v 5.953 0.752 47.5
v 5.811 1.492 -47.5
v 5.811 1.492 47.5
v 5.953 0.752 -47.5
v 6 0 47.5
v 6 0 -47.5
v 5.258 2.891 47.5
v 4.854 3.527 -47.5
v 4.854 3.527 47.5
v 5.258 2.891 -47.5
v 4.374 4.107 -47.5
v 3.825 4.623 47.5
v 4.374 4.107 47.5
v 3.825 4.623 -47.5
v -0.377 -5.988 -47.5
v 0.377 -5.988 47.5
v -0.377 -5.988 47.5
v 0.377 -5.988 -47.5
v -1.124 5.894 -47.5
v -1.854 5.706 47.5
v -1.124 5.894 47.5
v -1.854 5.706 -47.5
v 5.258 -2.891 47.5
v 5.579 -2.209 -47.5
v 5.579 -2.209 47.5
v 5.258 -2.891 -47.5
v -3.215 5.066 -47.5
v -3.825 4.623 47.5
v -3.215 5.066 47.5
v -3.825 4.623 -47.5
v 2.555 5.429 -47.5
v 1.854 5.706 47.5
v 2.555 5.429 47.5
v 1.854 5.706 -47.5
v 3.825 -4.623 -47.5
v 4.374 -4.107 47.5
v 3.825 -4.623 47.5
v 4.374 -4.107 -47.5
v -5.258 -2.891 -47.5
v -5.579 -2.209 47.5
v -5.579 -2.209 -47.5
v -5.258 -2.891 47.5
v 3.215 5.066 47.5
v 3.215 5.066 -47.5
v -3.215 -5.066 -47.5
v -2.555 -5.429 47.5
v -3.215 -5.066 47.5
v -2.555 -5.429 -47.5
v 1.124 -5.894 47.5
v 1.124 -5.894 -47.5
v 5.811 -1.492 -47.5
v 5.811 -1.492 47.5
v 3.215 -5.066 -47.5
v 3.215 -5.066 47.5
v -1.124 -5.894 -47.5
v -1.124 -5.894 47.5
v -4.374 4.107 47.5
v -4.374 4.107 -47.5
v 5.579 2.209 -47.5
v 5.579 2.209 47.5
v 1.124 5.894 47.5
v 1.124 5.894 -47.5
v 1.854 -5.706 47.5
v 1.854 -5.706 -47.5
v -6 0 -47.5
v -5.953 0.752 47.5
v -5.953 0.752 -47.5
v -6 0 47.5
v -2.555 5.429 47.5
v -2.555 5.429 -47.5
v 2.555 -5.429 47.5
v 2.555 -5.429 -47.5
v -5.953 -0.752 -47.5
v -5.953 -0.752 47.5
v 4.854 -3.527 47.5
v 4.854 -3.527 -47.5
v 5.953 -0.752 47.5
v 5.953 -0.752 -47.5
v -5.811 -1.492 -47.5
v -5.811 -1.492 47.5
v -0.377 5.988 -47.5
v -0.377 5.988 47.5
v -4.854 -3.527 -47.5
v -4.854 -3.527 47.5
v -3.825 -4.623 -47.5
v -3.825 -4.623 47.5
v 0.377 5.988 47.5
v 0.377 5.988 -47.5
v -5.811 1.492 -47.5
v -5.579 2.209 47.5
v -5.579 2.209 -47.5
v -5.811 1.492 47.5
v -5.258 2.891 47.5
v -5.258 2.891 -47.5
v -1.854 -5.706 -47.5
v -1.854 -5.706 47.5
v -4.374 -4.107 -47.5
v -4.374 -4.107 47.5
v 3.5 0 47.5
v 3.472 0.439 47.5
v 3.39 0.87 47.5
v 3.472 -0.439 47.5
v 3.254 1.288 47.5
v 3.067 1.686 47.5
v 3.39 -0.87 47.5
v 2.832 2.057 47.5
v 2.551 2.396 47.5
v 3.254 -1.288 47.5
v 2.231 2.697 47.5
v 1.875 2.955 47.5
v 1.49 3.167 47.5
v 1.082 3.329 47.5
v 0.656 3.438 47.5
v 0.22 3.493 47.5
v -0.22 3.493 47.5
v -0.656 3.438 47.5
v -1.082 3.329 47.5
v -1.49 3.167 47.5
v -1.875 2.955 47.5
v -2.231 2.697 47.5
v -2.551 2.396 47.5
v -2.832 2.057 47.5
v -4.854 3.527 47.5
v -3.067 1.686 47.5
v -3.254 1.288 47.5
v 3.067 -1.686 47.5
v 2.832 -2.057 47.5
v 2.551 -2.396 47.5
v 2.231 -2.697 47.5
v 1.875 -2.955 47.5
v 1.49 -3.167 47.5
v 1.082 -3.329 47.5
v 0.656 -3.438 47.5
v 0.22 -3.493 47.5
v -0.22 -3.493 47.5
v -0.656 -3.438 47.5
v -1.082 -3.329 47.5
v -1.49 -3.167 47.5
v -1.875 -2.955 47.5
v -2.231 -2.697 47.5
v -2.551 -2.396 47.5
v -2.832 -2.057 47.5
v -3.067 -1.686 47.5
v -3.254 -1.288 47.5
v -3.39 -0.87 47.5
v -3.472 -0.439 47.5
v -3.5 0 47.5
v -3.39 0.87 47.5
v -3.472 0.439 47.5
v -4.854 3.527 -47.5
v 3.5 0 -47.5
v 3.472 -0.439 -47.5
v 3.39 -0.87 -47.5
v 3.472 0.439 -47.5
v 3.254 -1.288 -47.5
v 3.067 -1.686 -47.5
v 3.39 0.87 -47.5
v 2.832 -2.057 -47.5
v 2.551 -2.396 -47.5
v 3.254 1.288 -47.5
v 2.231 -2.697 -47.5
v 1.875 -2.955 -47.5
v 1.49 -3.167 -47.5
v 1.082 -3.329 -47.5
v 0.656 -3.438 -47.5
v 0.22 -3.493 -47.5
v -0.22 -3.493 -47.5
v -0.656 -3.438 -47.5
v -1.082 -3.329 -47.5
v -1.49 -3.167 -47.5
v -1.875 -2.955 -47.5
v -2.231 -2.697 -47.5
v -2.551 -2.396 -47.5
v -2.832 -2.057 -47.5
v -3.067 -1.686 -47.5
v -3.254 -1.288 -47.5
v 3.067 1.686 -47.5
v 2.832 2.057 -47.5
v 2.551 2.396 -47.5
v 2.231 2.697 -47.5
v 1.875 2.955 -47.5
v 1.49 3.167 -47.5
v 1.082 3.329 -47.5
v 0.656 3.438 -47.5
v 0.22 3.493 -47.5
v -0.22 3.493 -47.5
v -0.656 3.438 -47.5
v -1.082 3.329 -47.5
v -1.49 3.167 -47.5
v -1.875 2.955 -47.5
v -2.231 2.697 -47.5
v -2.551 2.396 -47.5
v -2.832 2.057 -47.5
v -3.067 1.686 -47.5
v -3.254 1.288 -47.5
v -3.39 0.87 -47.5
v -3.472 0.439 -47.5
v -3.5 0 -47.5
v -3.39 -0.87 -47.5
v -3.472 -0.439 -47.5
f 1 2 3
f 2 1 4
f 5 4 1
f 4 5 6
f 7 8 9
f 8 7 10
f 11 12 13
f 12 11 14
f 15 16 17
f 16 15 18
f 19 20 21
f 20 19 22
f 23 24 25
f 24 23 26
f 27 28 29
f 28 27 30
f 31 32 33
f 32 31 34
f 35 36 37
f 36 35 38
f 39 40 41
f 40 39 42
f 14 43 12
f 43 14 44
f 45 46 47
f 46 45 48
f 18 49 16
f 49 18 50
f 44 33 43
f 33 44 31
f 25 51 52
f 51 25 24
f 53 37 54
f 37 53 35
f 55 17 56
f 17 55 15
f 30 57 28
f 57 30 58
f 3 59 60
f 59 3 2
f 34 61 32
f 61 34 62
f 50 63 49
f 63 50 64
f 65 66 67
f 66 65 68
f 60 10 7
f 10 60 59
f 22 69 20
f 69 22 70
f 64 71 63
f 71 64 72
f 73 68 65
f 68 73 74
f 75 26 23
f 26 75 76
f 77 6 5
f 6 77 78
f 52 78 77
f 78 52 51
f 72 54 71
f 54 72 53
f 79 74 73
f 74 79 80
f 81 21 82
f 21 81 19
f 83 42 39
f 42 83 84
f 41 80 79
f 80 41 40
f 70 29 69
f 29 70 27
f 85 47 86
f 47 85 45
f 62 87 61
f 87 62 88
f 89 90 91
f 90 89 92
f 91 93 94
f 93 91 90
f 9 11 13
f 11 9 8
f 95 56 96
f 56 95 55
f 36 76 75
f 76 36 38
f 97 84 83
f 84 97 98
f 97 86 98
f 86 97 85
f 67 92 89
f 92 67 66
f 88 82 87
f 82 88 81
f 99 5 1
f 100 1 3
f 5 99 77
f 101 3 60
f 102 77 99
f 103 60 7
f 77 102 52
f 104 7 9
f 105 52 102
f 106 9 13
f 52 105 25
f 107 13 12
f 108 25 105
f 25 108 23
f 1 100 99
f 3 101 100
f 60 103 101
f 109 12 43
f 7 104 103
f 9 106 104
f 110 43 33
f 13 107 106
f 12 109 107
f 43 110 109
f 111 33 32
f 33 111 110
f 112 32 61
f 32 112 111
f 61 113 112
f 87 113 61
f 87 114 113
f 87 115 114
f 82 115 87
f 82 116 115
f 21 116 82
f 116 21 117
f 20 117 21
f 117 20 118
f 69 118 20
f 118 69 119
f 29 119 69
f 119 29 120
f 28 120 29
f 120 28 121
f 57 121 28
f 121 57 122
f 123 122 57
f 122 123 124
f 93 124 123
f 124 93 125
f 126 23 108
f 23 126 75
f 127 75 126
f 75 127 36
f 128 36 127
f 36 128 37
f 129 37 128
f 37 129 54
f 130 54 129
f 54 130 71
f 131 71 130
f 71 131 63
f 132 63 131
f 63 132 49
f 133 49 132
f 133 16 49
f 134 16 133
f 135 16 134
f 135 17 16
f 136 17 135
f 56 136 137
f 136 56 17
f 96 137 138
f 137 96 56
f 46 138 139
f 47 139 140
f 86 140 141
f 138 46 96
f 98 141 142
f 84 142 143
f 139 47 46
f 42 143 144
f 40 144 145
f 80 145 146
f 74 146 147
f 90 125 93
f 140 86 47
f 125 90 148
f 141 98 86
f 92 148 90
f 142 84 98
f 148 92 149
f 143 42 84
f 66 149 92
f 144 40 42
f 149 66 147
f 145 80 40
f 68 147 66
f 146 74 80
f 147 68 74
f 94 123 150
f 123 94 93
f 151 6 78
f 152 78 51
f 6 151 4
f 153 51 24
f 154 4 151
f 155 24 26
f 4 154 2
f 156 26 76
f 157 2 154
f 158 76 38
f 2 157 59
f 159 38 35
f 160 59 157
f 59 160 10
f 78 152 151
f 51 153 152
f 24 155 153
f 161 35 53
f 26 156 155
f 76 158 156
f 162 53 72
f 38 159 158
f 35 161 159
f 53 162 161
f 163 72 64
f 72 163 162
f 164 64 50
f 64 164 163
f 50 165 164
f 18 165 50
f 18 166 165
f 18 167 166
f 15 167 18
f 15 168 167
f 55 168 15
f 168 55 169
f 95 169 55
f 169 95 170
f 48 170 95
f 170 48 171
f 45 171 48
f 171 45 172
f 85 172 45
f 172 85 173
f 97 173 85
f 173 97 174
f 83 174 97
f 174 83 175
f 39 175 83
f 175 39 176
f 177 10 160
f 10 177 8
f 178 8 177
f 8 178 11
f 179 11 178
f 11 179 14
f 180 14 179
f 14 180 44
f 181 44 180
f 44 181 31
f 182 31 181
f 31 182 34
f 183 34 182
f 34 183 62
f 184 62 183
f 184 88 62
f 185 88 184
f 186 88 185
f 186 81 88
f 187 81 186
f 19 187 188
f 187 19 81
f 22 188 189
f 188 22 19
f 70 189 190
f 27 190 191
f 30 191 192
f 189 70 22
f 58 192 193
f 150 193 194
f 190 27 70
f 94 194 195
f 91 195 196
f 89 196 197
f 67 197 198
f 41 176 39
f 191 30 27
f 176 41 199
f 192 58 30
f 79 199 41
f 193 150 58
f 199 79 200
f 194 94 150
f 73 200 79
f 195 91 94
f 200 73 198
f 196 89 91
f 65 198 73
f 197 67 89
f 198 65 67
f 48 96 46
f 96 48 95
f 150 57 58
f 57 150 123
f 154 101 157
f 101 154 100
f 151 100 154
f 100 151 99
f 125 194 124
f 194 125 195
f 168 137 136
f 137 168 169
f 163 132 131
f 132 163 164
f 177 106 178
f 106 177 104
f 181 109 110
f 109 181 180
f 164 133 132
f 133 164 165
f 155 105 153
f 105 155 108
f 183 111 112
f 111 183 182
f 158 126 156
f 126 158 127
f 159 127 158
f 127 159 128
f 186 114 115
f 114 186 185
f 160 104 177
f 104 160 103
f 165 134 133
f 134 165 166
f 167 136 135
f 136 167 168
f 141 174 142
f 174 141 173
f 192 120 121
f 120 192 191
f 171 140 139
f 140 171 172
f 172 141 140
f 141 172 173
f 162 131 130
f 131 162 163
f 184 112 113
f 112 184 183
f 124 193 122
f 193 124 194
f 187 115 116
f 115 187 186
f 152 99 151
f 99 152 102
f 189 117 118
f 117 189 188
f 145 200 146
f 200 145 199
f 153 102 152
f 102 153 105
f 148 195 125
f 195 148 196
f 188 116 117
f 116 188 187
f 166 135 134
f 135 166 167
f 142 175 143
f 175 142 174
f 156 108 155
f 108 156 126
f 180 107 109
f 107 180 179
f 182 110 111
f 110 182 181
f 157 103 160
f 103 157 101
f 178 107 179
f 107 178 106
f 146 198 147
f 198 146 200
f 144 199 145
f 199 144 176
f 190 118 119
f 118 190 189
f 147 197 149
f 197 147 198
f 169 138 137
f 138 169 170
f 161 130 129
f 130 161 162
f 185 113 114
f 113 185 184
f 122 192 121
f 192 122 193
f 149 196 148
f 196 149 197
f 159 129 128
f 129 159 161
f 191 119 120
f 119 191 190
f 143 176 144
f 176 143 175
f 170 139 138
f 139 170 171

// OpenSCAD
$fn = 50;


difference() {
	union() {
		translate(v = [0, 0, -47.5000000000]) {
			cylinder(h = 95, r = 6.0000000000);
		}
	}
	union() {
		translate(v = [0, 0, -100.0000000000]) {
			cylinder(h = 200, r = 3.5000000000);
		}
	}
}
